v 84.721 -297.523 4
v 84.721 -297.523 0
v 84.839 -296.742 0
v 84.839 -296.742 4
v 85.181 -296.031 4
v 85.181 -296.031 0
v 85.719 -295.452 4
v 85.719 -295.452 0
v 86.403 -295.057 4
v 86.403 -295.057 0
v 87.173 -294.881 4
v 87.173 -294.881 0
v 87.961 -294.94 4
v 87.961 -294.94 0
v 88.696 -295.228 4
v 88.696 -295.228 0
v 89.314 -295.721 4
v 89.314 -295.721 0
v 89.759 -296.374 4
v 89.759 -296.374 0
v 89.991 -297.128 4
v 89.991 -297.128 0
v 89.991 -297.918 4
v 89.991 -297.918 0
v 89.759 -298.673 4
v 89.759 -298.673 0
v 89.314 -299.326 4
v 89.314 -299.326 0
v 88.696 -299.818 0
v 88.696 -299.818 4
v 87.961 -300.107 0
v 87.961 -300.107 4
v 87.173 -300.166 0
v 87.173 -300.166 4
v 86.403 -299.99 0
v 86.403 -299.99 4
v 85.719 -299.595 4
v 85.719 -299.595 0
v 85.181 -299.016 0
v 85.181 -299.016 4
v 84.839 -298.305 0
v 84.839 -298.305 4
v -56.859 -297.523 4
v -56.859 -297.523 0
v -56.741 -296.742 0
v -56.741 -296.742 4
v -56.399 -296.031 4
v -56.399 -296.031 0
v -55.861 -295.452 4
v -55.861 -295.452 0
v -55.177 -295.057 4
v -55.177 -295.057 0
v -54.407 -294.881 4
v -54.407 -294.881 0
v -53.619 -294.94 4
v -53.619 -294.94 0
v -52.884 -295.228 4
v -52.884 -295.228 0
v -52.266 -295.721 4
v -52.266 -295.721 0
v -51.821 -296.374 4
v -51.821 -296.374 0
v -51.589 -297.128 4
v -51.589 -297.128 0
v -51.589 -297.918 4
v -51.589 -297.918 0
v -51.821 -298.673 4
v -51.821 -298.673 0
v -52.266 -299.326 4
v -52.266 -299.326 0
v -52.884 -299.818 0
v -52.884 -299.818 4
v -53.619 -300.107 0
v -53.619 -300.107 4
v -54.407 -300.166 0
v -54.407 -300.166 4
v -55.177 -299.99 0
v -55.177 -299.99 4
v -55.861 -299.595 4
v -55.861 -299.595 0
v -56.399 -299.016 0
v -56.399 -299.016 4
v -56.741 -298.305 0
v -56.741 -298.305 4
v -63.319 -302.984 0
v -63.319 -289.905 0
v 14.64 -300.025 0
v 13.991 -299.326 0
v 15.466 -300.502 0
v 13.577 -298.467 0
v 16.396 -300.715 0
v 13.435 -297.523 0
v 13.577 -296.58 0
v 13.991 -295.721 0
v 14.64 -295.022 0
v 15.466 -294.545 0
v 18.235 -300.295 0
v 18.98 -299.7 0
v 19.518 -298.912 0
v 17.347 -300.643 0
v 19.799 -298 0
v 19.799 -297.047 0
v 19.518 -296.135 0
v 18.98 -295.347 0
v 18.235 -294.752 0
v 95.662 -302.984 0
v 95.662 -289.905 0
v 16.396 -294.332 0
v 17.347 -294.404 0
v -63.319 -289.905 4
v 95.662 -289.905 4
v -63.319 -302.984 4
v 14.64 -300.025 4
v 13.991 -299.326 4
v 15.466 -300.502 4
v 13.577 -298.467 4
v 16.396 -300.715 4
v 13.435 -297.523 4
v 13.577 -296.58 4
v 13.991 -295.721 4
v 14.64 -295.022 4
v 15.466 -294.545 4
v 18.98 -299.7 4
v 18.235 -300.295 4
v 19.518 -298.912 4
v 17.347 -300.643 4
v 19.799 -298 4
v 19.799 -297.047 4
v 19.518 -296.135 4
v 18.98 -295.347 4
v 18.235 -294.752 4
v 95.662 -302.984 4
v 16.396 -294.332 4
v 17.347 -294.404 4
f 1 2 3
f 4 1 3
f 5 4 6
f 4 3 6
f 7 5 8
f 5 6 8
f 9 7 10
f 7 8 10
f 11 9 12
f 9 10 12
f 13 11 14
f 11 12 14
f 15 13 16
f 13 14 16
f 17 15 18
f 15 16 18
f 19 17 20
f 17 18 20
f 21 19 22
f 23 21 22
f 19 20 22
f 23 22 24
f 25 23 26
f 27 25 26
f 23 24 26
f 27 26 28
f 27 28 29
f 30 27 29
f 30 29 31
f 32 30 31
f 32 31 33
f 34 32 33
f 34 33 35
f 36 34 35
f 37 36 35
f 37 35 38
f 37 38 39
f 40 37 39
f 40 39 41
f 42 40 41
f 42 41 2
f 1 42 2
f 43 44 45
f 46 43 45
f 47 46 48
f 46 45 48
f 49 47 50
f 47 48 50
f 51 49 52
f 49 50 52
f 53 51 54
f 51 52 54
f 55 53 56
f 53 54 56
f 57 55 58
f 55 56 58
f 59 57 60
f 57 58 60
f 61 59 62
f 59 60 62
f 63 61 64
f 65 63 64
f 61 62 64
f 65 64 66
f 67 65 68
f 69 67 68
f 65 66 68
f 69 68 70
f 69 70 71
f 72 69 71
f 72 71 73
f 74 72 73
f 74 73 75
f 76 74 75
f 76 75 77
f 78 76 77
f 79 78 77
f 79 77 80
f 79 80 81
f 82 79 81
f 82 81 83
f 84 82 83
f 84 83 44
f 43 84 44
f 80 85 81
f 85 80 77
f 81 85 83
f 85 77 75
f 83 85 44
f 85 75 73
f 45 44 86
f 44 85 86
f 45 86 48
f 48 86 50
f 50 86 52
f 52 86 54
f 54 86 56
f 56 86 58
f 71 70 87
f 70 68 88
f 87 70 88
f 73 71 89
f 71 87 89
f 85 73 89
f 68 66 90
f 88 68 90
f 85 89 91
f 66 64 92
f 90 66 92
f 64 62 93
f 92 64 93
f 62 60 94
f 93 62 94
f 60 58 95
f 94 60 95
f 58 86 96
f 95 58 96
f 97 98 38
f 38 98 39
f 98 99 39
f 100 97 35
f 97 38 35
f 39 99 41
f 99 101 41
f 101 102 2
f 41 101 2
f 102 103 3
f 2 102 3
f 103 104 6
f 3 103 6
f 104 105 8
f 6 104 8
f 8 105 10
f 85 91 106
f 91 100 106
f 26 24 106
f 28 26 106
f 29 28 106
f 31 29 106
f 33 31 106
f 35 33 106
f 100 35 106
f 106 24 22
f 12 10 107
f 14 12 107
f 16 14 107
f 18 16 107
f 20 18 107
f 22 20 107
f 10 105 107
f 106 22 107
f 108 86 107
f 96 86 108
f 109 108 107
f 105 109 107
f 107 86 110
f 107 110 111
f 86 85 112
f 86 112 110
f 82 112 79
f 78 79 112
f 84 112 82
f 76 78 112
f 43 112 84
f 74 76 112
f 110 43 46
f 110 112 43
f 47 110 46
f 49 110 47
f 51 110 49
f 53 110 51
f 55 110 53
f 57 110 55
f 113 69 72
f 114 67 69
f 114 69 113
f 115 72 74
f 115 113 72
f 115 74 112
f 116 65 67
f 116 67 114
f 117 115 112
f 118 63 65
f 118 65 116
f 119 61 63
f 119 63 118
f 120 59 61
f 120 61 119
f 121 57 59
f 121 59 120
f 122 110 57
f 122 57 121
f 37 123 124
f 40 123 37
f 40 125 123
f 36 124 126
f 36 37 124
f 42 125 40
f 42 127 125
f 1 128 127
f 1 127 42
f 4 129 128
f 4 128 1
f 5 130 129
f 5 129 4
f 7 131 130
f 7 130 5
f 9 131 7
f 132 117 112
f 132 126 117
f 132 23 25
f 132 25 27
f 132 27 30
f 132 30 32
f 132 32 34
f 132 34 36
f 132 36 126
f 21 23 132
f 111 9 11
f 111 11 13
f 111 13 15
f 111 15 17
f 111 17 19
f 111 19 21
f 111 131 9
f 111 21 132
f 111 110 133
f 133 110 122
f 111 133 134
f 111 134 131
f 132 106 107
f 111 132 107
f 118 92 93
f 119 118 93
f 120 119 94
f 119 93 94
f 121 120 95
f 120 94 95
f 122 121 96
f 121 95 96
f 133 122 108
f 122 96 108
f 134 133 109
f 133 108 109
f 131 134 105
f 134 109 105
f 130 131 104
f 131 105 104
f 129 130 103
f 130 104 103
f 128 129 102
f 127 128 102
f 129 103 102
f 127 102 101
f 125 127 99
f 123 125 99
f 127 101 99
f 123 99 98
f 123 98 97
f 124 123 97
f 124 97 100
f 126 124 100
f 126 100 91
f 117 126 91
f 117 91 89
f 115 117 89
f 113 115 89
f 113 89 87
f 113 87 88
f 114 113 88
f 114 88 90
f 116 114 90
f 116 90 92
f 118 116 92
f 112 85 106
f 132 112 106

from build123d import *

# Parameters (mm, degrees)
SKETCH1_W            = 158.980651351
SKETCH1_H            = 13.078234564
BOSS_EXTRUDE1_DEPTH  = 4
M5_CLEARANCE_HOLE1_D = 5.3
M6_CLEARANCE_HOLE2_D = 6.4


with BuildPart() as part:
    # Sketch1 → Boss-Extrude1 (new body)
    with BuildSketch(Plane.XY):
        with Locations((16.171323843, -296.4446159)):
            Rectangle(SKETCH1_W, SKETCH1_H)
    extrude(amount=BOSS_EXTRUDE1_DEPTH)

    # M5 Clearance Hole1 (through all)
    with Locations(Plane.XY.offset(4)):
        with Locations((87.370998167, -297.523461342), (-54.209001833, -297.523461342)):
            Hole(M5_CLEARANCE_HOLE1_D / 2)

    # M6 Clearance Hole2 (through all)
    with Locations(Plane.XY.offset(4)):
        with Locations((16.634702444, -297.523461342)):
            Hole(M6_CLEARANCE_HOLE2_D / 2)


solid = part.part
